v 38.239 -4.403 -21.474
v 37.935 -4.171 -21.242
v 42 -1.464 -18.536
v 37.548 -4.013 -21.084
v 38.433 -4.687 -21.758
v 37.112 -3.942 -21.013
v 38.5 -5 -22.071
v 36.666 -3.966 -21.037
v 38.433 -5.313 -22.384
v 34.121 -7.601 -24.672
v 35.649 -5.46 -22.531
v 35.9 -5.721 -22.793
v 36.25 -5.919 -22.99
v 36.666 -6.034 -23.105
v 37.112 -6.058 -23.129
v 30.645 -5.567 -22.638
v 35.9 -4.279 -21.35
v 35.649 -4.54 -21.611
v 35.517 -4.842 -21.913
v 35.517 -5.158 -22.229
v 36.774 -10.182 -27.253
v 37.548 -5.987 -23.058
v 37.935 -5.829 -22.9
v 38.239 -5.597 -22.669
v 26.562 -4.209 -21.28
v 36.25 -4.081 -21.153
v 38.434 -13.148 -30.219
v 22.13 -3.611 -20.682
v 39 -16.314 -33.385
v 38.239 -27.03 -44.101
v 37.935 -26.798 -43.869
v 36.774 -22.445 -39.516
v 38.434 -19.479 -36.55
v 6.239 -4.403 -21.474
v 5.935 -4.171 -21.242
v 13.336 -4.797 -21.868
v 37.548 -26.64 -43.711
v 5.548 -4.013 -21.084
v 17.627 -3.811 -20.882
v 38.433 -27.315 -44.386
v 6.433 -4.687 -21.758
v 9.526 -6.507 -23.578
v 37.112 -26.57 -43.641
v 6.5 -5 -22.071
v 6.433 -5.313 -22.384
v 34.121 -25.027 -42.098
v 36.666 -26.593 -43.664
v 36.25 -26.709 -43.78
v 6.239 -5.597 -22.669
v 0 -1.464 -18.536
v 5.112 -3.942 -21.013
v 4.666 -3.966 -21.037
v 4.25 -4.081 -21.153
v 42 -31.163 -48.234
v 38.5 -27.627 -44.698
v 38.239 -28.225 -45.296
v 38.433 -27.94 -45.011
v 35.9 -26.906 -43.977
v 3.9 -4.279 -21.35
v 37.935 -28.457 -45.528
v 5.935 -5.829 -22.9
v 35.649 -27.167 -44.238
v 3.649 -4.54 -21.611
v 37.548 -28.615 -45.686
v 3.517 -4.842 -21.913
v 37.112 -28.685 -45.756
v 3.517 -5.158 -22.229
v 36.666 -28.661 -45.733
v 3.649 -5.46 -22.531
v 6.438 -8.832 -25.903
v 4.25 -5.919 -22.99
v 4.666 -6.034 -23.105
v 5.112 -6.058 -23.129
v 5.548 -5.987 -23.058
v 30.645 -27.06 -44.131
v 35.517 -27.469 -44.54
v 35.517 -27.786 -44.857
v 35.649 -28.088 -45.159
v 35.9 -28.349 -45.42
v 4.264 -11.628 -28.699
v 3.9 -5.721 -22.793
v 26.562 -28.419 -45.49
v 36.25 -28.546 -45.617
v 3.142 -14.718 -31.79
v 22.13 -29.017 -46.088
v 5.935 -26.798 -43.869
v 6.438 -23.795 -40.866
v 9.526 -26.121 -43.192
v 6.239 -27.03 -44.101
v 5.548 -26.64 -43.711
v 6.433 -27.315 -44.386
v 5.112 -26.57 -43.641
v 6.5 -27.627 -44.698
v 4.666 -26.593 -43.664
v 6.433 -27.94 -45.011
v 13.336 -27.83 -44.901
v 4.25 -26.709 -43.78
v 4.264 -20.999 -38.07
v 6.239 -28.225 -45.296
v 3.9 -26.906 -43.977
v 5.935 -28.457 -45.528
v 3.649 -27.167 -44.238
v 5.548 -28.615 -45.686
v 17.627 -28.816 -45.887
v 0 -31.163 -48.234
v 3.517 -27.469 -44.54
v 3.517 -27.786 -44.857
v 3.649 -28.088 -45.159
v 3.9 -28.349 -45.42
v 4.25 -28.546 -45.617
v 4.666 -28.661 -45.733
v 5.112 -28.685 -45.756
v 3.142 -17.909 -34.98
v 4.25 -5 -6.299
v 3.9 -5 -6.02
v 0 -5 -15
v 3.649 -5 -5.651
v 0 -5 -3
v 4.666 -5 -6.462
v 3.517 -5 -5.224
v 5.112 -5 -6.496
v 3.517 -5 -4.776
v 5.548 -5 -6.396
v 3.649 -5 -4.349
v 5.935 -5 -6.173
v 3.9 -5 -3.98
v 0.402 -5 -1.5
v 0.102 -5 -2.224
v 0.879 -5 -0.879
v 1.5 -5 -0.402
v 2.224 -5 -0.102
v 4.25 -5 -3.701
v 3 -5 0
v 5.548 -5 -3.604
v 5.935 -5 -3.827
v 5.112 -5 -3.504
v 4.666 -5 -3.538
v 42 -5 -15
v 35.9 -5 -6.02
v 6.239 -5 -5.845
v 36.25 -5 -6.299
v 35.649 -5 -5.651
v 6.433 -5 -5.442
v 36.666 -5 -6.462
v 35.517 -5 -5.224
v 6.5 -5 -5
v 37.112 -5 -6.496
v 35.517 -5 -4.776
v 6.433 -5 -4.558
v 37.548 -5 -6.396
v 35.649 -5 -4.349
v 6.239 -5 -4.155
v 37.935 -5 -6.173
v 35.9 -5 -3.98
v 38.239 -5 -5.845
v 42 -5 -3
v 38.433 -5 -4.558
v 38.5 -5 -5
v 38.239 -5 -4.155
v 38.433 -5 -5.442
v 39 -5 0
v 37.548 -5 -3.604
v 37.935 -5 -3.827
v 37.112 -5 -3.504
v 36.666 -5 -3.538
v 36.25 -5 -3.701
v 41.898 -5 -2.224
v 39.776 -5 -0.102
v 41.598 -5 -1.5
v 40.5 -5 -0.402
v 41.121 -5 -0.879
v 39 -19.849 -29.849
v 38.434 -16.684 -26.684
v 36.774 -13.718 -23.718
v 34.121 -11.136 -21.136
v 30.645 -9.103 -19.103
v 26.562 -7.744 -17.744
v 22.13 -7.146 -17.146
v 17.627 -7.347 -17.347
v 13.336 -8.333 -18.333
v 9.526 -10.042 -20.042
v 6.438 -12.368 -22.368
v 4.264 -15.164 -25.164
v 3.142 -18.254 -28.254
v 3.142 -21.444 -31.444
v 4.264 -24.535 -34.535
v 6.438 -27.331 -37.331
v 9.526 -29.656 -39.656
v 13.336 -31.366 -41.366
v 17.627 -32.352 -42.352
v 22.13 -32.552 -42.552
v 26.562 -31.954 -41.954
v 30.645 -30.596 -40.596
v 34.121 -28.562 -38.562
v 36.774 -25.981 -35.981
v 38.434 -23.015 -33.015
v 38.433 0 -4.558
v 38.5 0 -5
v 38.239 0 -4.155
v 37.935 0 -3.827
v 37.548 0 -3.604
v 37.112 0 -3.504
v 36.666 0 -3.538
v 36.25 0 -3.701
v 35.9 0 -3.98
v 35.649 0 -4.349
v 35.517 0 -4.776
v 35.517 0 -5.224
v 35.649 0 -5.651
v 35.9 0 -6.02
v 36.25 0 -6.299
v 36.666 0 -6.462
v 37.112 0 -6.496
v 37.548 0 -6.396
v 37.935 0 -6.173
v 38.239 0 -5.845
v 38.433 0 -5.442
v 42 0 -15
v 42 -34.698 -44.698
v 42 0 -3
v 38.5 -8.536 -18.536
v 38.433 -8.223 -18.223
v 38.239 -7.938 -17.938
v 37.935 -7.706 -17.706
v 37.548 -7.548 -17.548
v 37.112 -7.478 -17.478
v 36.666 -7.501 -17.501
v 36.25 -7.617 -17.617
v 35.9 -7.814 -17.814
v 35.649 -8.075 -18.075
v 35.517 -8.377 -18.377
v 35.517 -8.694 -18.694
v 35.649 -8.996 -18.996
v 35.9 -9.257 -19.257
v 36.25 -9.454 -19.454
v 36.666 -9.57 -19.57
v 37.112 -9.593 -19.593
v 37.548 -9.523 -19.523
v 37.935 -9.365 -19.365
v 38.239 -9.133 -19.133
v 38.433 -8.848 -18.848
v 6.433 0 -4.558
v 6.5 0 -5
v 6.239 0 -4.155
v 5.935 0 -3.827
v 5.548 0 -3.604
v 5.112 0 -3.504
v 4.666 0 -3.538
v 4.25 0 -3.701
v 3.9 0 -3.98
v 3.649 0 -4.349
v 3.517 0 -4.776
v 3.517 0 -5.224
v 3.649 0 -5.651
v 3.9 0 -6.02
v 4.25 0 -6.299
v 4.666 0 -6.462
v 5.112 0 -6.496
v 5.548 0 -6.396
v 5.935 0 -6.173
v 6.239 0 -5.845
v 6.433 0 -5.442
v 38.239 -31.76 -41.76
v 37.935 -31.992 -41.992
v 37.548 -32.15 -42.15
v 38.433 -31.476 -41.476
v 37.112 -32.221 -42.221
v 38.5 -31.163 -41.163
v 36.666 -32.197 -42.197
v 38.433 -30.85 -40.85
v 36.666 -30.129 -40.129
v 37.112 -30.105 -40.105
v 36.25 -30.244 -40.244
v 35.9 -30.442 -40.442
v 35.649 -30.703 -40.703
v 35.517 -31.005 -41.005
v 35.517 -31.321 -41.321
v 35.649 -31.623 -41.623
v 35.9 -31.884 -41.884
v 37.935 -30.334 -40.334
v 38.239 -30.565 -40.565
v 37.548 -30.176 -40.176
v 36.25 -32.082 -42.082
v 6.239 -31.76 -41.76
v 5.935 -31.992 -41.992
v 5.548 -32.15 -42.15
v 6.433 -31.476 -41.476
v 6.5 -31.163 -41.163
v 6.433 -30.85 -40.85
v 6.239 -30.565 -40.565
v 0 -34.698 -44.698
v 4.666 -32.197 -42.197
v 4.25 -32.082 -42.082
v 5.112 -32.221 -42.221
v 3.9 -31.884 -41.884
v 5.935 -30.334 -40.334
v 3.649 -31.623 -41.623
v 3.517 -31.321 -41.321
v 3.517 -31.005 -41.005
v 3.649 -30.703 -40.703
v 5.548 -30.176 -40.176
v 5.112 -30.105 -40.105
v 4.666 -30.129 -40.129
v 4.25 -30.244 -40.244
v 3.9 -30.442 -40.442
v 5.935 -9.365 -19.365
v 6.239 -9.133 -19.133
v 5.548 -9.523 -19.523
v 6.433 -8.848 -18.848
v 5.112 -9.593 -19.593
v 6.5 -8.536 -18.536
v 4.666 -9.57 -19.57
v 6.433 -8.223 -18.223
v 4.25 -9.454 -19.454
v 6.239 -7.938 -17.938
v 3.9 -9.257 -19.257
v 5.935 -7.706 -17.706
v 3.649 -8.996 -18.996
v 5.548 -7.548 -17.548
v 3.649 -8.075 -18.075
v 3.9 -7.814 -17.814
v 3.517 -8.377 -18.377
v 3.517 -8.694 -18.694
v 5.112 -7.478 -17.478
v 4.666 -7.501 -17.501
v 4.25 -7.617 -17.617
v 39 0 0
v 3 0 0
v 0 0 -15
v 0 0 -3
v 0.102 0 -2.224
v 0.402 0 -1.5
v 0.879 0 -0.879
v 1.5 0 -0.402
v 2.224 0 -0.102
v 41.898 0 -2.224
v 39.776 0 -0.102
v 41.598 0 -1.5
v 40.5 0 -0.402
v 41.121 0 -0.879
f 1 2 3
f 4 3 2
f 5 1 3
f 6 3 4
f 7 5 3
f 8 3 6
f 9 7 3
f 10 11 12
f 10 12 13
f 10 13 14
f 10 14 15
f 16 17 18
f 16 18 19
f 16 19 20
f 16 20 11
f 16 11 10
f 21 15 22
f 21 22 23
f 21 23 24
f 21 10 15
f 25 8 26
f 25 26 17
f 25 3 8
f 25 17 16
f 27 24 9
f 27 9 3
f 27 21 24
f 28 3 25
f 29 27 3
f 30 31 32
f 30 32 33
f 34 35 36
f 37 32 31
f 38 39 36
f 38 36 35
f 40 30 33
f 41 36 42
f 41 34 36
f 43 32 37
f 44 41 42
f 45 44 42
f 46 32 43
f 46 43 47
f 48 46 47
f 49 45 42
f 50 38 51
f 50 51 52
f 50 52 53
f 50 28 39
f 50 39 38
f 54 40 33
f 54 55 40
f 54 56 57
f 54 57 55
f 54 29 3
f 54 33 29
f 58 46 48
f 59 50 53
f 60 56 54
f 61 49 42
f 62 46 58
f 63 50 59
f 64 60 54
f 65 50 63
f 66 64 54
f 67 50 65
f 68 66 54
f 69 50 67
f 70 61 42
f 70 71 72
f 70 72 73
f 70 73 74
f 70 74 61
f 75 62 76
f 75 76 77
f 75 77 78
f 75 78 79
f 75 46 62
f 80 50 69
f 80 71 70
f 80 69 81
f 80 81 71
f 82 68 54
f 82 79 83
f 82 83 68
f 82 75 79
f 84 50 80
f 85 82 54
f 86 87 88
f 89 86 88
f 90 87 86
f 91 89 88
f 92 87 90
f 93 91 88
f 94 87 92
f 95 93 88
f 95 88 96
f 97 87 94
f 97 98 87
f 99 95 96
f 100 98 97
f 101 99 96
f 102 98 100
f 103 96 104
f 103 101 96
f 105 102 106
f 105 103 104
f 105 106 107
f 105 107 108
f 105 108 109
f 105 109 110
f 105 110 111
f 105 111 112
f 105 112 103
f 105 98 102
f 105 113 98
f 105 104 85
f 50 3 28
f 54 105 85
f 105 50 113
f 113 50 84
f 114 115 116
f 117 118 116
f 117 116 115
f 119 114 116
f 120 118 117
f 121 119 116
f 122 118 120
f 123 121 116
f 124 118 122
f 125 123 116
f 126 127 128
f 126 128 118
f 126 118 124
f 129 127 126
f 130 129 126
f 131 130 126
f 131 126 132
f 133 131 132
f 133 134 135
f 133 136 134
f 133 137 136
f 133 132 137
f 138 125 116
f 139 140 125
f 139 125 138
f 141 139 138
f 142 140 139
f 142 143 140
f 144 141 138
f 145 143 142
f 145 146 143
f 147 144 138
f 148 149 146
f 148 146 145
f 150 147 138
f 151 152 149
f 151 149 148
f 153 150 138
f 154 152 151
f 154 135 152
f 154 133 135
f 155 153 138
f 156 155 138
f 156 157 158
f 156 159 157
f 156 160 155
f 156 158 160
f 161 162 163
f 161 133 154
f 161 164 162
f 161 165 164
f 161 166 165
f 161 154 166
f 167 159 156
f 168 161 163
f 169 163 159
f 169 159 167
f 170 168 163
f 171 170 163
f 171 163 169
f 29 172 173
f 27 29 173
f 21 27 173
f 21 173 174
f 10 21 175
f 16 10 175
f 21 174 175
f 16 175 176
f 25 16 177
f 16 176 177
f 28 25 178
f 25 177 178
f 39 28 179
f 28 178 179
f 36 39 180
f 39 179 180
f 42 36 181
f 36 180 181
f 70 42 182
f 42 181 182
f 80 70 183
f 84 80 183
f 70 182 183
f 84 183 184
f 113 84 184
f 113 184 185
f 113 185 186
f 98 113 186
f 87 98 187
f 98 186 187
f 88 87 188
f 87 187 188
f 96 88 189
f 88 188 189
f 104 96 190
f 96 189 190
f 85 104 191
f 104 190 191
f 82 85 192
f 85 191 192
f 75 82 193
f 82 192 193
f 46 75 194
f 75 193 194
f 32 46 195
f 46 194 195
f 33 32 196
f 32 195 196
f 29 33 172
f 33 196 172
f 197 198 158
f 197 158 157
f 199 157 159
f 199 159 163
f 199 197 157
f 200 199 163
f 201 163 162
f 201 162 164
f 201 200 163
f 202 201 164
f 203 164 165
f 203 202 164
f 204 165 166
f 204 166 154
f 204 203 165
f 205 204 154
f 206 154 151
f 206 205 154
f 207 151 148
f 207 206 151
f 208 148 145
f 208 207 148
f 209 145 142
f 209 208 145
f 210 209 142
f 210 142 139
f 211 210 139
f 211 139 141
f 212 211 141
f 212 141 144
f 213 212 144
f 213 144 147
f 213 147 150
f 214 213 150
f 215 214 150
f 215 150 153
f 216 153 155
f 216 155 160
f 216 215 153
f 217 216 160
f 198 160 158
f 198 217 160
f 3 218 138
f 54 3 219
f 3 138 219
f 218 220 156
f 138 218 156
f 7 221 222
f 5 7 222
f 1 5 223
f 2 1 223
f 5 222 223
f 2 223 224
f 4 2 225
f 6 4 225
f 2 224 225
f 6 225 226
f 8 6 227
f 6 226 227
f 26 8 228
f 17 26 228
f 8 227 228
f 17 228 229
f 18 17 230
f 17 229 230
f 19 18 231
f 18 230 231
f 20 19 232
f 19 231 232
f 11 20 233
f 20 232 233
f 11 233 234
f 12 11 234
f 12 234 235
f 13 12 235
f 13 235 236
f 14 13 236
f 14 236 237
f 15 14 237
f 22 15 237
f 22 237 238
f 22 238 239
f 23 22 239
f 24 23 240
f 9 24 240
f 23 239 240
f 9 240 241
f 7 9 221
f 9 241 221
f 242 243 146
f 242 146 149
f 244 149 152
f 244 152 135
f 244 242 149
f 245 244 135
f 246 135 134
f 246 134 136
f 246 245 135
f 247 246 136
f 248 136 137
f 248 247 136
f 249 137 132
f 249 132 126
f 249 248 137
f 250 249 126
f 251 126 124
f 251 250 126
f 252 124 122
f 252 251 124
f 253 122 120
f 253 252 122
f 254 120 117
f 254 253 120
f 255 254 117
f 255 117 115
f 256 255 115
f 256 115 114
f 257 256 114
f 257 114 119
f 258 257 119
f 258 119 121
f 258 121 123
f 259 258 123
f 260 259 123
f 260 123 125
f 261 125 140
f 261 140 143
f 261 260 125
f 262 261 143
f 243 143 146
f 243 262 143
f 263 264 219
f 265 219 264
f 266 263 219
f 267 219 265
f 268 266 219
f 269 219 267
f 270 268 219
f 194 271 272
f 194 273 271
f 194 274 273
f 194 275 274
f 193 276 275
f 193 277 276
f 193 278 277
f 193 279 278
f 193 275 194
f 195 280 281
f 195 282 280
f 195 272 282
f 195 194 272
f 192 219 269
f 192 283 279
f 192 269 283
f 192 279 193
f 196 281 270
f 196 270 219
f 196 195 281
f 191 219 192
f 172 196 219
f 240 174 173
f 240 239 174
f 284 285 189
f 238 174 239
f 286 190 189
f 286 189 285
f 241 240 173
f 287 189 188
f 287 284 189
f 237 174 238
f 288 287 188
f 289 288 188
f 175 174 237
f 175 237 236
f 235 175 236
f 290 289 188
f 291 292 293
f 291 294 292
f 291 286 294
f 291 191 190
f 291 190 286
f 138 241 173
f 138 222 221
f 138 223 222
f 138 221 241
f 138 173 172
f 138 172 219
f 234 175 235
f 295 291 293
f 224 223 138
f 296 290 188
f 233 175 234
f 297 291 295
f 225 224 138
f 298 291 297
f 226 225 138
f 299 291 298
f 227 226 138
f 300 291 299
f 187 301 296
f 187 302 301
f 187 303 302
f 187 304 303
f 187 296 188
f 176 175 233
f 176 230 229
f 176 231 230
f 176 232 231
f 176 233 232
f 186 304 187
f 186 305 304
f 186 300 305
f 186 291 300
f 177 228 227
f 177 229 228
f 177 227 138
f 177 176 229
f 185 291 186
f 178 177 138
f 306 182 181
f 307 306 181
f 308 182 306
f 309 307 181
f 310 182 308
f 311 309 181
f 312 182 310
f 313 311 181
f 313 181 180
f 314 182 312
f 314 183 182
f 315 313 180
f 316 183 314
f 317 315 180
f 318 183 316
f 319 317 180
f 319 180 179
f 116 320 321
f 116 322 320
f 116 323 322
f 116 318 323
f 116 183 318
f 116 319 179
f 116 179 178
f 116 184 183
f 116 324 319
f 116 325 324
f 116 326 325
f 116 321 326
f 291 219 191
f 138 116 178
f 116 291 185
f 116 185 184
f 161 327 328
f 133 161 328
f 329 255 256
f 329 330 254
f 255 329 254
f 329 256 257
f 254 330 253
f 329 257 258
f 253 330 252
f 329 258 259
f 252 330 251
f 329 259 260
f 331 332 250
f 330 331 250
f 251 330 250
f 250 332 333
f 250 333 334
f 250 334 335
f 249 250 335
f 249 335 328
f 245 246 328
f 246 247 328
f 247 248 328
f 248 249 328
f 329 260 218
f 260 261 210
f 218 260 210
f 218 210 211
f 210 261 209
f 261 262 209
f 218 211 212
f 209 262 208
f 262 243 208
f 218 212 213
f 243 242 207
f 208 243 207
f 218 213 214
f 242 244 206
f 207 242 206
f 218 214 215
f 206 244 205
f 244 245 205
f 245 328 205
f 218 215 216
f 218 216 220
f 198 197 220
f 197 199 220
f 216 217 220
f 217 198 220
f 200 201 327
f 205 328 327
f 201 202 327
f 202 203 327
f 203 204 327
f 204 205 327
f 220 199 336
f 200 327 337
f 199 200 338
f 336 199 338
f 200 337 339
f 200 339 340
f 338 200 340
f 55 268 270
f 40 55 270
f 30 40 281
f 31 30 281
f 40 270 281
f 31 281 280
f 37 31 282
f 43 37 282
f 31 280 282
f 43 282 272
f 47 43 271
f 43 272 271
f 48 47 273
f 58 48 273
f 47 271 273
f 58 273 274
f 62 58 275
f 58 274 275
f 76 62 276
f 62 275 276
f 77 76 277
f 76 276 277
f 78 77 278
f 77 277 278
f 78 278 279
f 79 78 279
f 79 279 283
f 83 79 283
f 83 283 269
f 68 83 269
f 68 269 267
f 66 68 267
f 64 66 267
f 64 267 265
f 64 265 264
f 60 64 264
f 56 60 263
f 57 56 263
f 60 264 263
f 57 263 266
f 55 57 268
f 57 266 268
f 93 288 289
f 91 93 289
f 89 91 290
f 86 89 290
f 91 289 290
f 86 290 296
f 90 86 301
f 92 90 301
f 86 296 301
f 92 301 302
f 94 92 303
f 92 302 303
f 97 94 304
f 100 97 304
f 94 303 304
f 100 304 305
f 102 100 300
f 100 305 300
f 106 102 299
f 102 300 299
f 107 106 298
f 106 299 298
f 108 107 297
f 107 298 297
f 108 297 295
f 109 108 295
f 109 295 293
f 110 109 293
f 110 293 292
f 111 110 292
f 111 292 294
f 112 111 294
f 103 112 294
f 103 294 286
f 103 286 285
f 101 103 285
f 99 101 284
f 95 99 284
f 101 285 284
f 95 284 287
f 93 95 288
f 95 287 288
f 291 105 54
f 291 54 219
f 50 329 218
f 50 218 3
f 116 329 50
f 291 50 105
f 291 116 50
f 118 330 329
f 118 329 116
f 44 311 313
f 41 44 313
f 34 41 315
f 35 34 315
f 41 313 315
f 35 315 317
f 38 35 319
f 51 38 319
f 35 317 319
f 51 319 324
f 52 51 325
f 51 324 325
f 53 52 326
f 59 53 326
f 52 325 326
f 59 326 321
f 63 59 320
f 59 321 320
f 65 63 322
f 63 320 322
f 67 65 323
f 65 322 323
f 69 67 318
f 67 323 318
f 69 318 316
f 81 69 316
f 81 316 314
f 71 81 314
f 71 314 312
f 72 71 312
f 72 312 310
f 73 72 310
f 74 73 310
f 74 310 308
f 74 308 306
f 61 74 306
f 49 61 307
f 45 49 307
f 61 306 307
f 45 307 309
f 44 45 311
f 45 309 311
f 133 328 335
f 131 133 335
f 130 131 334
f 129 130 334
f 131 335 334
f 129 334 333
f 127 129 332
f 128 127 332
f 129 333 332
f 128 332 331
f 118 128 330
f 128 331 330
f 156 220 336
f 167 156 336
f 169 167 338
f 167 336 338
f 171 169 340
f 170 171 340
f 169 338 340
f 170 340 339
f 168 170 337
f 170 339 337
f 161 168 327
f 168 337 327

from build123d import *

# Parameters (mm, degrees)
F0_R     = 1.5
F1_DEPTH = 5
F3_DEPTH = 42
F4_R     = 1.5
F4_R_2   = 18
F5_DEPTH = 5


with BuildPart() as f1:
    # F0 (on Front) → F1 (new body)
    with BuildSketch(Plane.XZ):
        with BuildLine():
            Line((39, 0), (3, 0))
            ThreePointArc((3, 0), (0.87868, -0.87868), (0, -3))
            Line((0, -3), (0, -15))
            Line((0, -15), (42, -15))
            Line((42, -15), (42, -3))
            ThreePointArc((42, -3), (41.12132, -0.87868), (39, 0))
        make_face()
        with Locations((5, -5)):
            Circle(F0_R, mode=Mode.SUBTRACT)
        with Locations((37, -5)):
            Circle(F0_R, mode=Mode.SUBTRACT)
    extrude(amount=F1_DEPTH)

    # F2 (on face) → F3 (join)
    with BuildSketch(Plane(origin=(0, 0, 0), x_dir=(0, -1, 0), z_dir=(-1, 0, 0))):
        Polygon((34.698485, -44.698485), (5, -15), (0, -15), (1.464466, -18.535534), (31.162951, -48.234019), align=None)
    extrude(amount=-F3_DEPTH)

    # F4 (on face) → F5 (cut)
    with BuildSketch(Plane(origin=(0, 5, -5), x_dir=(1, 0, 0), z_dir=(0, -0.707107, 0.707107))):
        with Locations((37, -19.142136)):
            Circle(F4_R)
        with Locations((37, -51.142136)):
            Circle(F4_R)
        with Locations((5, -51.142136)):
            Circle(F4_R)
        with Locations((5, -19.142136)):
            Circle(F4_R)
        with Locations((21, -35.142136)):
            Circle(F4_R_2)
    extrude(amount=-F5_DEPTH, mode=Mode.SUBTRACT)


solid = f1.part
